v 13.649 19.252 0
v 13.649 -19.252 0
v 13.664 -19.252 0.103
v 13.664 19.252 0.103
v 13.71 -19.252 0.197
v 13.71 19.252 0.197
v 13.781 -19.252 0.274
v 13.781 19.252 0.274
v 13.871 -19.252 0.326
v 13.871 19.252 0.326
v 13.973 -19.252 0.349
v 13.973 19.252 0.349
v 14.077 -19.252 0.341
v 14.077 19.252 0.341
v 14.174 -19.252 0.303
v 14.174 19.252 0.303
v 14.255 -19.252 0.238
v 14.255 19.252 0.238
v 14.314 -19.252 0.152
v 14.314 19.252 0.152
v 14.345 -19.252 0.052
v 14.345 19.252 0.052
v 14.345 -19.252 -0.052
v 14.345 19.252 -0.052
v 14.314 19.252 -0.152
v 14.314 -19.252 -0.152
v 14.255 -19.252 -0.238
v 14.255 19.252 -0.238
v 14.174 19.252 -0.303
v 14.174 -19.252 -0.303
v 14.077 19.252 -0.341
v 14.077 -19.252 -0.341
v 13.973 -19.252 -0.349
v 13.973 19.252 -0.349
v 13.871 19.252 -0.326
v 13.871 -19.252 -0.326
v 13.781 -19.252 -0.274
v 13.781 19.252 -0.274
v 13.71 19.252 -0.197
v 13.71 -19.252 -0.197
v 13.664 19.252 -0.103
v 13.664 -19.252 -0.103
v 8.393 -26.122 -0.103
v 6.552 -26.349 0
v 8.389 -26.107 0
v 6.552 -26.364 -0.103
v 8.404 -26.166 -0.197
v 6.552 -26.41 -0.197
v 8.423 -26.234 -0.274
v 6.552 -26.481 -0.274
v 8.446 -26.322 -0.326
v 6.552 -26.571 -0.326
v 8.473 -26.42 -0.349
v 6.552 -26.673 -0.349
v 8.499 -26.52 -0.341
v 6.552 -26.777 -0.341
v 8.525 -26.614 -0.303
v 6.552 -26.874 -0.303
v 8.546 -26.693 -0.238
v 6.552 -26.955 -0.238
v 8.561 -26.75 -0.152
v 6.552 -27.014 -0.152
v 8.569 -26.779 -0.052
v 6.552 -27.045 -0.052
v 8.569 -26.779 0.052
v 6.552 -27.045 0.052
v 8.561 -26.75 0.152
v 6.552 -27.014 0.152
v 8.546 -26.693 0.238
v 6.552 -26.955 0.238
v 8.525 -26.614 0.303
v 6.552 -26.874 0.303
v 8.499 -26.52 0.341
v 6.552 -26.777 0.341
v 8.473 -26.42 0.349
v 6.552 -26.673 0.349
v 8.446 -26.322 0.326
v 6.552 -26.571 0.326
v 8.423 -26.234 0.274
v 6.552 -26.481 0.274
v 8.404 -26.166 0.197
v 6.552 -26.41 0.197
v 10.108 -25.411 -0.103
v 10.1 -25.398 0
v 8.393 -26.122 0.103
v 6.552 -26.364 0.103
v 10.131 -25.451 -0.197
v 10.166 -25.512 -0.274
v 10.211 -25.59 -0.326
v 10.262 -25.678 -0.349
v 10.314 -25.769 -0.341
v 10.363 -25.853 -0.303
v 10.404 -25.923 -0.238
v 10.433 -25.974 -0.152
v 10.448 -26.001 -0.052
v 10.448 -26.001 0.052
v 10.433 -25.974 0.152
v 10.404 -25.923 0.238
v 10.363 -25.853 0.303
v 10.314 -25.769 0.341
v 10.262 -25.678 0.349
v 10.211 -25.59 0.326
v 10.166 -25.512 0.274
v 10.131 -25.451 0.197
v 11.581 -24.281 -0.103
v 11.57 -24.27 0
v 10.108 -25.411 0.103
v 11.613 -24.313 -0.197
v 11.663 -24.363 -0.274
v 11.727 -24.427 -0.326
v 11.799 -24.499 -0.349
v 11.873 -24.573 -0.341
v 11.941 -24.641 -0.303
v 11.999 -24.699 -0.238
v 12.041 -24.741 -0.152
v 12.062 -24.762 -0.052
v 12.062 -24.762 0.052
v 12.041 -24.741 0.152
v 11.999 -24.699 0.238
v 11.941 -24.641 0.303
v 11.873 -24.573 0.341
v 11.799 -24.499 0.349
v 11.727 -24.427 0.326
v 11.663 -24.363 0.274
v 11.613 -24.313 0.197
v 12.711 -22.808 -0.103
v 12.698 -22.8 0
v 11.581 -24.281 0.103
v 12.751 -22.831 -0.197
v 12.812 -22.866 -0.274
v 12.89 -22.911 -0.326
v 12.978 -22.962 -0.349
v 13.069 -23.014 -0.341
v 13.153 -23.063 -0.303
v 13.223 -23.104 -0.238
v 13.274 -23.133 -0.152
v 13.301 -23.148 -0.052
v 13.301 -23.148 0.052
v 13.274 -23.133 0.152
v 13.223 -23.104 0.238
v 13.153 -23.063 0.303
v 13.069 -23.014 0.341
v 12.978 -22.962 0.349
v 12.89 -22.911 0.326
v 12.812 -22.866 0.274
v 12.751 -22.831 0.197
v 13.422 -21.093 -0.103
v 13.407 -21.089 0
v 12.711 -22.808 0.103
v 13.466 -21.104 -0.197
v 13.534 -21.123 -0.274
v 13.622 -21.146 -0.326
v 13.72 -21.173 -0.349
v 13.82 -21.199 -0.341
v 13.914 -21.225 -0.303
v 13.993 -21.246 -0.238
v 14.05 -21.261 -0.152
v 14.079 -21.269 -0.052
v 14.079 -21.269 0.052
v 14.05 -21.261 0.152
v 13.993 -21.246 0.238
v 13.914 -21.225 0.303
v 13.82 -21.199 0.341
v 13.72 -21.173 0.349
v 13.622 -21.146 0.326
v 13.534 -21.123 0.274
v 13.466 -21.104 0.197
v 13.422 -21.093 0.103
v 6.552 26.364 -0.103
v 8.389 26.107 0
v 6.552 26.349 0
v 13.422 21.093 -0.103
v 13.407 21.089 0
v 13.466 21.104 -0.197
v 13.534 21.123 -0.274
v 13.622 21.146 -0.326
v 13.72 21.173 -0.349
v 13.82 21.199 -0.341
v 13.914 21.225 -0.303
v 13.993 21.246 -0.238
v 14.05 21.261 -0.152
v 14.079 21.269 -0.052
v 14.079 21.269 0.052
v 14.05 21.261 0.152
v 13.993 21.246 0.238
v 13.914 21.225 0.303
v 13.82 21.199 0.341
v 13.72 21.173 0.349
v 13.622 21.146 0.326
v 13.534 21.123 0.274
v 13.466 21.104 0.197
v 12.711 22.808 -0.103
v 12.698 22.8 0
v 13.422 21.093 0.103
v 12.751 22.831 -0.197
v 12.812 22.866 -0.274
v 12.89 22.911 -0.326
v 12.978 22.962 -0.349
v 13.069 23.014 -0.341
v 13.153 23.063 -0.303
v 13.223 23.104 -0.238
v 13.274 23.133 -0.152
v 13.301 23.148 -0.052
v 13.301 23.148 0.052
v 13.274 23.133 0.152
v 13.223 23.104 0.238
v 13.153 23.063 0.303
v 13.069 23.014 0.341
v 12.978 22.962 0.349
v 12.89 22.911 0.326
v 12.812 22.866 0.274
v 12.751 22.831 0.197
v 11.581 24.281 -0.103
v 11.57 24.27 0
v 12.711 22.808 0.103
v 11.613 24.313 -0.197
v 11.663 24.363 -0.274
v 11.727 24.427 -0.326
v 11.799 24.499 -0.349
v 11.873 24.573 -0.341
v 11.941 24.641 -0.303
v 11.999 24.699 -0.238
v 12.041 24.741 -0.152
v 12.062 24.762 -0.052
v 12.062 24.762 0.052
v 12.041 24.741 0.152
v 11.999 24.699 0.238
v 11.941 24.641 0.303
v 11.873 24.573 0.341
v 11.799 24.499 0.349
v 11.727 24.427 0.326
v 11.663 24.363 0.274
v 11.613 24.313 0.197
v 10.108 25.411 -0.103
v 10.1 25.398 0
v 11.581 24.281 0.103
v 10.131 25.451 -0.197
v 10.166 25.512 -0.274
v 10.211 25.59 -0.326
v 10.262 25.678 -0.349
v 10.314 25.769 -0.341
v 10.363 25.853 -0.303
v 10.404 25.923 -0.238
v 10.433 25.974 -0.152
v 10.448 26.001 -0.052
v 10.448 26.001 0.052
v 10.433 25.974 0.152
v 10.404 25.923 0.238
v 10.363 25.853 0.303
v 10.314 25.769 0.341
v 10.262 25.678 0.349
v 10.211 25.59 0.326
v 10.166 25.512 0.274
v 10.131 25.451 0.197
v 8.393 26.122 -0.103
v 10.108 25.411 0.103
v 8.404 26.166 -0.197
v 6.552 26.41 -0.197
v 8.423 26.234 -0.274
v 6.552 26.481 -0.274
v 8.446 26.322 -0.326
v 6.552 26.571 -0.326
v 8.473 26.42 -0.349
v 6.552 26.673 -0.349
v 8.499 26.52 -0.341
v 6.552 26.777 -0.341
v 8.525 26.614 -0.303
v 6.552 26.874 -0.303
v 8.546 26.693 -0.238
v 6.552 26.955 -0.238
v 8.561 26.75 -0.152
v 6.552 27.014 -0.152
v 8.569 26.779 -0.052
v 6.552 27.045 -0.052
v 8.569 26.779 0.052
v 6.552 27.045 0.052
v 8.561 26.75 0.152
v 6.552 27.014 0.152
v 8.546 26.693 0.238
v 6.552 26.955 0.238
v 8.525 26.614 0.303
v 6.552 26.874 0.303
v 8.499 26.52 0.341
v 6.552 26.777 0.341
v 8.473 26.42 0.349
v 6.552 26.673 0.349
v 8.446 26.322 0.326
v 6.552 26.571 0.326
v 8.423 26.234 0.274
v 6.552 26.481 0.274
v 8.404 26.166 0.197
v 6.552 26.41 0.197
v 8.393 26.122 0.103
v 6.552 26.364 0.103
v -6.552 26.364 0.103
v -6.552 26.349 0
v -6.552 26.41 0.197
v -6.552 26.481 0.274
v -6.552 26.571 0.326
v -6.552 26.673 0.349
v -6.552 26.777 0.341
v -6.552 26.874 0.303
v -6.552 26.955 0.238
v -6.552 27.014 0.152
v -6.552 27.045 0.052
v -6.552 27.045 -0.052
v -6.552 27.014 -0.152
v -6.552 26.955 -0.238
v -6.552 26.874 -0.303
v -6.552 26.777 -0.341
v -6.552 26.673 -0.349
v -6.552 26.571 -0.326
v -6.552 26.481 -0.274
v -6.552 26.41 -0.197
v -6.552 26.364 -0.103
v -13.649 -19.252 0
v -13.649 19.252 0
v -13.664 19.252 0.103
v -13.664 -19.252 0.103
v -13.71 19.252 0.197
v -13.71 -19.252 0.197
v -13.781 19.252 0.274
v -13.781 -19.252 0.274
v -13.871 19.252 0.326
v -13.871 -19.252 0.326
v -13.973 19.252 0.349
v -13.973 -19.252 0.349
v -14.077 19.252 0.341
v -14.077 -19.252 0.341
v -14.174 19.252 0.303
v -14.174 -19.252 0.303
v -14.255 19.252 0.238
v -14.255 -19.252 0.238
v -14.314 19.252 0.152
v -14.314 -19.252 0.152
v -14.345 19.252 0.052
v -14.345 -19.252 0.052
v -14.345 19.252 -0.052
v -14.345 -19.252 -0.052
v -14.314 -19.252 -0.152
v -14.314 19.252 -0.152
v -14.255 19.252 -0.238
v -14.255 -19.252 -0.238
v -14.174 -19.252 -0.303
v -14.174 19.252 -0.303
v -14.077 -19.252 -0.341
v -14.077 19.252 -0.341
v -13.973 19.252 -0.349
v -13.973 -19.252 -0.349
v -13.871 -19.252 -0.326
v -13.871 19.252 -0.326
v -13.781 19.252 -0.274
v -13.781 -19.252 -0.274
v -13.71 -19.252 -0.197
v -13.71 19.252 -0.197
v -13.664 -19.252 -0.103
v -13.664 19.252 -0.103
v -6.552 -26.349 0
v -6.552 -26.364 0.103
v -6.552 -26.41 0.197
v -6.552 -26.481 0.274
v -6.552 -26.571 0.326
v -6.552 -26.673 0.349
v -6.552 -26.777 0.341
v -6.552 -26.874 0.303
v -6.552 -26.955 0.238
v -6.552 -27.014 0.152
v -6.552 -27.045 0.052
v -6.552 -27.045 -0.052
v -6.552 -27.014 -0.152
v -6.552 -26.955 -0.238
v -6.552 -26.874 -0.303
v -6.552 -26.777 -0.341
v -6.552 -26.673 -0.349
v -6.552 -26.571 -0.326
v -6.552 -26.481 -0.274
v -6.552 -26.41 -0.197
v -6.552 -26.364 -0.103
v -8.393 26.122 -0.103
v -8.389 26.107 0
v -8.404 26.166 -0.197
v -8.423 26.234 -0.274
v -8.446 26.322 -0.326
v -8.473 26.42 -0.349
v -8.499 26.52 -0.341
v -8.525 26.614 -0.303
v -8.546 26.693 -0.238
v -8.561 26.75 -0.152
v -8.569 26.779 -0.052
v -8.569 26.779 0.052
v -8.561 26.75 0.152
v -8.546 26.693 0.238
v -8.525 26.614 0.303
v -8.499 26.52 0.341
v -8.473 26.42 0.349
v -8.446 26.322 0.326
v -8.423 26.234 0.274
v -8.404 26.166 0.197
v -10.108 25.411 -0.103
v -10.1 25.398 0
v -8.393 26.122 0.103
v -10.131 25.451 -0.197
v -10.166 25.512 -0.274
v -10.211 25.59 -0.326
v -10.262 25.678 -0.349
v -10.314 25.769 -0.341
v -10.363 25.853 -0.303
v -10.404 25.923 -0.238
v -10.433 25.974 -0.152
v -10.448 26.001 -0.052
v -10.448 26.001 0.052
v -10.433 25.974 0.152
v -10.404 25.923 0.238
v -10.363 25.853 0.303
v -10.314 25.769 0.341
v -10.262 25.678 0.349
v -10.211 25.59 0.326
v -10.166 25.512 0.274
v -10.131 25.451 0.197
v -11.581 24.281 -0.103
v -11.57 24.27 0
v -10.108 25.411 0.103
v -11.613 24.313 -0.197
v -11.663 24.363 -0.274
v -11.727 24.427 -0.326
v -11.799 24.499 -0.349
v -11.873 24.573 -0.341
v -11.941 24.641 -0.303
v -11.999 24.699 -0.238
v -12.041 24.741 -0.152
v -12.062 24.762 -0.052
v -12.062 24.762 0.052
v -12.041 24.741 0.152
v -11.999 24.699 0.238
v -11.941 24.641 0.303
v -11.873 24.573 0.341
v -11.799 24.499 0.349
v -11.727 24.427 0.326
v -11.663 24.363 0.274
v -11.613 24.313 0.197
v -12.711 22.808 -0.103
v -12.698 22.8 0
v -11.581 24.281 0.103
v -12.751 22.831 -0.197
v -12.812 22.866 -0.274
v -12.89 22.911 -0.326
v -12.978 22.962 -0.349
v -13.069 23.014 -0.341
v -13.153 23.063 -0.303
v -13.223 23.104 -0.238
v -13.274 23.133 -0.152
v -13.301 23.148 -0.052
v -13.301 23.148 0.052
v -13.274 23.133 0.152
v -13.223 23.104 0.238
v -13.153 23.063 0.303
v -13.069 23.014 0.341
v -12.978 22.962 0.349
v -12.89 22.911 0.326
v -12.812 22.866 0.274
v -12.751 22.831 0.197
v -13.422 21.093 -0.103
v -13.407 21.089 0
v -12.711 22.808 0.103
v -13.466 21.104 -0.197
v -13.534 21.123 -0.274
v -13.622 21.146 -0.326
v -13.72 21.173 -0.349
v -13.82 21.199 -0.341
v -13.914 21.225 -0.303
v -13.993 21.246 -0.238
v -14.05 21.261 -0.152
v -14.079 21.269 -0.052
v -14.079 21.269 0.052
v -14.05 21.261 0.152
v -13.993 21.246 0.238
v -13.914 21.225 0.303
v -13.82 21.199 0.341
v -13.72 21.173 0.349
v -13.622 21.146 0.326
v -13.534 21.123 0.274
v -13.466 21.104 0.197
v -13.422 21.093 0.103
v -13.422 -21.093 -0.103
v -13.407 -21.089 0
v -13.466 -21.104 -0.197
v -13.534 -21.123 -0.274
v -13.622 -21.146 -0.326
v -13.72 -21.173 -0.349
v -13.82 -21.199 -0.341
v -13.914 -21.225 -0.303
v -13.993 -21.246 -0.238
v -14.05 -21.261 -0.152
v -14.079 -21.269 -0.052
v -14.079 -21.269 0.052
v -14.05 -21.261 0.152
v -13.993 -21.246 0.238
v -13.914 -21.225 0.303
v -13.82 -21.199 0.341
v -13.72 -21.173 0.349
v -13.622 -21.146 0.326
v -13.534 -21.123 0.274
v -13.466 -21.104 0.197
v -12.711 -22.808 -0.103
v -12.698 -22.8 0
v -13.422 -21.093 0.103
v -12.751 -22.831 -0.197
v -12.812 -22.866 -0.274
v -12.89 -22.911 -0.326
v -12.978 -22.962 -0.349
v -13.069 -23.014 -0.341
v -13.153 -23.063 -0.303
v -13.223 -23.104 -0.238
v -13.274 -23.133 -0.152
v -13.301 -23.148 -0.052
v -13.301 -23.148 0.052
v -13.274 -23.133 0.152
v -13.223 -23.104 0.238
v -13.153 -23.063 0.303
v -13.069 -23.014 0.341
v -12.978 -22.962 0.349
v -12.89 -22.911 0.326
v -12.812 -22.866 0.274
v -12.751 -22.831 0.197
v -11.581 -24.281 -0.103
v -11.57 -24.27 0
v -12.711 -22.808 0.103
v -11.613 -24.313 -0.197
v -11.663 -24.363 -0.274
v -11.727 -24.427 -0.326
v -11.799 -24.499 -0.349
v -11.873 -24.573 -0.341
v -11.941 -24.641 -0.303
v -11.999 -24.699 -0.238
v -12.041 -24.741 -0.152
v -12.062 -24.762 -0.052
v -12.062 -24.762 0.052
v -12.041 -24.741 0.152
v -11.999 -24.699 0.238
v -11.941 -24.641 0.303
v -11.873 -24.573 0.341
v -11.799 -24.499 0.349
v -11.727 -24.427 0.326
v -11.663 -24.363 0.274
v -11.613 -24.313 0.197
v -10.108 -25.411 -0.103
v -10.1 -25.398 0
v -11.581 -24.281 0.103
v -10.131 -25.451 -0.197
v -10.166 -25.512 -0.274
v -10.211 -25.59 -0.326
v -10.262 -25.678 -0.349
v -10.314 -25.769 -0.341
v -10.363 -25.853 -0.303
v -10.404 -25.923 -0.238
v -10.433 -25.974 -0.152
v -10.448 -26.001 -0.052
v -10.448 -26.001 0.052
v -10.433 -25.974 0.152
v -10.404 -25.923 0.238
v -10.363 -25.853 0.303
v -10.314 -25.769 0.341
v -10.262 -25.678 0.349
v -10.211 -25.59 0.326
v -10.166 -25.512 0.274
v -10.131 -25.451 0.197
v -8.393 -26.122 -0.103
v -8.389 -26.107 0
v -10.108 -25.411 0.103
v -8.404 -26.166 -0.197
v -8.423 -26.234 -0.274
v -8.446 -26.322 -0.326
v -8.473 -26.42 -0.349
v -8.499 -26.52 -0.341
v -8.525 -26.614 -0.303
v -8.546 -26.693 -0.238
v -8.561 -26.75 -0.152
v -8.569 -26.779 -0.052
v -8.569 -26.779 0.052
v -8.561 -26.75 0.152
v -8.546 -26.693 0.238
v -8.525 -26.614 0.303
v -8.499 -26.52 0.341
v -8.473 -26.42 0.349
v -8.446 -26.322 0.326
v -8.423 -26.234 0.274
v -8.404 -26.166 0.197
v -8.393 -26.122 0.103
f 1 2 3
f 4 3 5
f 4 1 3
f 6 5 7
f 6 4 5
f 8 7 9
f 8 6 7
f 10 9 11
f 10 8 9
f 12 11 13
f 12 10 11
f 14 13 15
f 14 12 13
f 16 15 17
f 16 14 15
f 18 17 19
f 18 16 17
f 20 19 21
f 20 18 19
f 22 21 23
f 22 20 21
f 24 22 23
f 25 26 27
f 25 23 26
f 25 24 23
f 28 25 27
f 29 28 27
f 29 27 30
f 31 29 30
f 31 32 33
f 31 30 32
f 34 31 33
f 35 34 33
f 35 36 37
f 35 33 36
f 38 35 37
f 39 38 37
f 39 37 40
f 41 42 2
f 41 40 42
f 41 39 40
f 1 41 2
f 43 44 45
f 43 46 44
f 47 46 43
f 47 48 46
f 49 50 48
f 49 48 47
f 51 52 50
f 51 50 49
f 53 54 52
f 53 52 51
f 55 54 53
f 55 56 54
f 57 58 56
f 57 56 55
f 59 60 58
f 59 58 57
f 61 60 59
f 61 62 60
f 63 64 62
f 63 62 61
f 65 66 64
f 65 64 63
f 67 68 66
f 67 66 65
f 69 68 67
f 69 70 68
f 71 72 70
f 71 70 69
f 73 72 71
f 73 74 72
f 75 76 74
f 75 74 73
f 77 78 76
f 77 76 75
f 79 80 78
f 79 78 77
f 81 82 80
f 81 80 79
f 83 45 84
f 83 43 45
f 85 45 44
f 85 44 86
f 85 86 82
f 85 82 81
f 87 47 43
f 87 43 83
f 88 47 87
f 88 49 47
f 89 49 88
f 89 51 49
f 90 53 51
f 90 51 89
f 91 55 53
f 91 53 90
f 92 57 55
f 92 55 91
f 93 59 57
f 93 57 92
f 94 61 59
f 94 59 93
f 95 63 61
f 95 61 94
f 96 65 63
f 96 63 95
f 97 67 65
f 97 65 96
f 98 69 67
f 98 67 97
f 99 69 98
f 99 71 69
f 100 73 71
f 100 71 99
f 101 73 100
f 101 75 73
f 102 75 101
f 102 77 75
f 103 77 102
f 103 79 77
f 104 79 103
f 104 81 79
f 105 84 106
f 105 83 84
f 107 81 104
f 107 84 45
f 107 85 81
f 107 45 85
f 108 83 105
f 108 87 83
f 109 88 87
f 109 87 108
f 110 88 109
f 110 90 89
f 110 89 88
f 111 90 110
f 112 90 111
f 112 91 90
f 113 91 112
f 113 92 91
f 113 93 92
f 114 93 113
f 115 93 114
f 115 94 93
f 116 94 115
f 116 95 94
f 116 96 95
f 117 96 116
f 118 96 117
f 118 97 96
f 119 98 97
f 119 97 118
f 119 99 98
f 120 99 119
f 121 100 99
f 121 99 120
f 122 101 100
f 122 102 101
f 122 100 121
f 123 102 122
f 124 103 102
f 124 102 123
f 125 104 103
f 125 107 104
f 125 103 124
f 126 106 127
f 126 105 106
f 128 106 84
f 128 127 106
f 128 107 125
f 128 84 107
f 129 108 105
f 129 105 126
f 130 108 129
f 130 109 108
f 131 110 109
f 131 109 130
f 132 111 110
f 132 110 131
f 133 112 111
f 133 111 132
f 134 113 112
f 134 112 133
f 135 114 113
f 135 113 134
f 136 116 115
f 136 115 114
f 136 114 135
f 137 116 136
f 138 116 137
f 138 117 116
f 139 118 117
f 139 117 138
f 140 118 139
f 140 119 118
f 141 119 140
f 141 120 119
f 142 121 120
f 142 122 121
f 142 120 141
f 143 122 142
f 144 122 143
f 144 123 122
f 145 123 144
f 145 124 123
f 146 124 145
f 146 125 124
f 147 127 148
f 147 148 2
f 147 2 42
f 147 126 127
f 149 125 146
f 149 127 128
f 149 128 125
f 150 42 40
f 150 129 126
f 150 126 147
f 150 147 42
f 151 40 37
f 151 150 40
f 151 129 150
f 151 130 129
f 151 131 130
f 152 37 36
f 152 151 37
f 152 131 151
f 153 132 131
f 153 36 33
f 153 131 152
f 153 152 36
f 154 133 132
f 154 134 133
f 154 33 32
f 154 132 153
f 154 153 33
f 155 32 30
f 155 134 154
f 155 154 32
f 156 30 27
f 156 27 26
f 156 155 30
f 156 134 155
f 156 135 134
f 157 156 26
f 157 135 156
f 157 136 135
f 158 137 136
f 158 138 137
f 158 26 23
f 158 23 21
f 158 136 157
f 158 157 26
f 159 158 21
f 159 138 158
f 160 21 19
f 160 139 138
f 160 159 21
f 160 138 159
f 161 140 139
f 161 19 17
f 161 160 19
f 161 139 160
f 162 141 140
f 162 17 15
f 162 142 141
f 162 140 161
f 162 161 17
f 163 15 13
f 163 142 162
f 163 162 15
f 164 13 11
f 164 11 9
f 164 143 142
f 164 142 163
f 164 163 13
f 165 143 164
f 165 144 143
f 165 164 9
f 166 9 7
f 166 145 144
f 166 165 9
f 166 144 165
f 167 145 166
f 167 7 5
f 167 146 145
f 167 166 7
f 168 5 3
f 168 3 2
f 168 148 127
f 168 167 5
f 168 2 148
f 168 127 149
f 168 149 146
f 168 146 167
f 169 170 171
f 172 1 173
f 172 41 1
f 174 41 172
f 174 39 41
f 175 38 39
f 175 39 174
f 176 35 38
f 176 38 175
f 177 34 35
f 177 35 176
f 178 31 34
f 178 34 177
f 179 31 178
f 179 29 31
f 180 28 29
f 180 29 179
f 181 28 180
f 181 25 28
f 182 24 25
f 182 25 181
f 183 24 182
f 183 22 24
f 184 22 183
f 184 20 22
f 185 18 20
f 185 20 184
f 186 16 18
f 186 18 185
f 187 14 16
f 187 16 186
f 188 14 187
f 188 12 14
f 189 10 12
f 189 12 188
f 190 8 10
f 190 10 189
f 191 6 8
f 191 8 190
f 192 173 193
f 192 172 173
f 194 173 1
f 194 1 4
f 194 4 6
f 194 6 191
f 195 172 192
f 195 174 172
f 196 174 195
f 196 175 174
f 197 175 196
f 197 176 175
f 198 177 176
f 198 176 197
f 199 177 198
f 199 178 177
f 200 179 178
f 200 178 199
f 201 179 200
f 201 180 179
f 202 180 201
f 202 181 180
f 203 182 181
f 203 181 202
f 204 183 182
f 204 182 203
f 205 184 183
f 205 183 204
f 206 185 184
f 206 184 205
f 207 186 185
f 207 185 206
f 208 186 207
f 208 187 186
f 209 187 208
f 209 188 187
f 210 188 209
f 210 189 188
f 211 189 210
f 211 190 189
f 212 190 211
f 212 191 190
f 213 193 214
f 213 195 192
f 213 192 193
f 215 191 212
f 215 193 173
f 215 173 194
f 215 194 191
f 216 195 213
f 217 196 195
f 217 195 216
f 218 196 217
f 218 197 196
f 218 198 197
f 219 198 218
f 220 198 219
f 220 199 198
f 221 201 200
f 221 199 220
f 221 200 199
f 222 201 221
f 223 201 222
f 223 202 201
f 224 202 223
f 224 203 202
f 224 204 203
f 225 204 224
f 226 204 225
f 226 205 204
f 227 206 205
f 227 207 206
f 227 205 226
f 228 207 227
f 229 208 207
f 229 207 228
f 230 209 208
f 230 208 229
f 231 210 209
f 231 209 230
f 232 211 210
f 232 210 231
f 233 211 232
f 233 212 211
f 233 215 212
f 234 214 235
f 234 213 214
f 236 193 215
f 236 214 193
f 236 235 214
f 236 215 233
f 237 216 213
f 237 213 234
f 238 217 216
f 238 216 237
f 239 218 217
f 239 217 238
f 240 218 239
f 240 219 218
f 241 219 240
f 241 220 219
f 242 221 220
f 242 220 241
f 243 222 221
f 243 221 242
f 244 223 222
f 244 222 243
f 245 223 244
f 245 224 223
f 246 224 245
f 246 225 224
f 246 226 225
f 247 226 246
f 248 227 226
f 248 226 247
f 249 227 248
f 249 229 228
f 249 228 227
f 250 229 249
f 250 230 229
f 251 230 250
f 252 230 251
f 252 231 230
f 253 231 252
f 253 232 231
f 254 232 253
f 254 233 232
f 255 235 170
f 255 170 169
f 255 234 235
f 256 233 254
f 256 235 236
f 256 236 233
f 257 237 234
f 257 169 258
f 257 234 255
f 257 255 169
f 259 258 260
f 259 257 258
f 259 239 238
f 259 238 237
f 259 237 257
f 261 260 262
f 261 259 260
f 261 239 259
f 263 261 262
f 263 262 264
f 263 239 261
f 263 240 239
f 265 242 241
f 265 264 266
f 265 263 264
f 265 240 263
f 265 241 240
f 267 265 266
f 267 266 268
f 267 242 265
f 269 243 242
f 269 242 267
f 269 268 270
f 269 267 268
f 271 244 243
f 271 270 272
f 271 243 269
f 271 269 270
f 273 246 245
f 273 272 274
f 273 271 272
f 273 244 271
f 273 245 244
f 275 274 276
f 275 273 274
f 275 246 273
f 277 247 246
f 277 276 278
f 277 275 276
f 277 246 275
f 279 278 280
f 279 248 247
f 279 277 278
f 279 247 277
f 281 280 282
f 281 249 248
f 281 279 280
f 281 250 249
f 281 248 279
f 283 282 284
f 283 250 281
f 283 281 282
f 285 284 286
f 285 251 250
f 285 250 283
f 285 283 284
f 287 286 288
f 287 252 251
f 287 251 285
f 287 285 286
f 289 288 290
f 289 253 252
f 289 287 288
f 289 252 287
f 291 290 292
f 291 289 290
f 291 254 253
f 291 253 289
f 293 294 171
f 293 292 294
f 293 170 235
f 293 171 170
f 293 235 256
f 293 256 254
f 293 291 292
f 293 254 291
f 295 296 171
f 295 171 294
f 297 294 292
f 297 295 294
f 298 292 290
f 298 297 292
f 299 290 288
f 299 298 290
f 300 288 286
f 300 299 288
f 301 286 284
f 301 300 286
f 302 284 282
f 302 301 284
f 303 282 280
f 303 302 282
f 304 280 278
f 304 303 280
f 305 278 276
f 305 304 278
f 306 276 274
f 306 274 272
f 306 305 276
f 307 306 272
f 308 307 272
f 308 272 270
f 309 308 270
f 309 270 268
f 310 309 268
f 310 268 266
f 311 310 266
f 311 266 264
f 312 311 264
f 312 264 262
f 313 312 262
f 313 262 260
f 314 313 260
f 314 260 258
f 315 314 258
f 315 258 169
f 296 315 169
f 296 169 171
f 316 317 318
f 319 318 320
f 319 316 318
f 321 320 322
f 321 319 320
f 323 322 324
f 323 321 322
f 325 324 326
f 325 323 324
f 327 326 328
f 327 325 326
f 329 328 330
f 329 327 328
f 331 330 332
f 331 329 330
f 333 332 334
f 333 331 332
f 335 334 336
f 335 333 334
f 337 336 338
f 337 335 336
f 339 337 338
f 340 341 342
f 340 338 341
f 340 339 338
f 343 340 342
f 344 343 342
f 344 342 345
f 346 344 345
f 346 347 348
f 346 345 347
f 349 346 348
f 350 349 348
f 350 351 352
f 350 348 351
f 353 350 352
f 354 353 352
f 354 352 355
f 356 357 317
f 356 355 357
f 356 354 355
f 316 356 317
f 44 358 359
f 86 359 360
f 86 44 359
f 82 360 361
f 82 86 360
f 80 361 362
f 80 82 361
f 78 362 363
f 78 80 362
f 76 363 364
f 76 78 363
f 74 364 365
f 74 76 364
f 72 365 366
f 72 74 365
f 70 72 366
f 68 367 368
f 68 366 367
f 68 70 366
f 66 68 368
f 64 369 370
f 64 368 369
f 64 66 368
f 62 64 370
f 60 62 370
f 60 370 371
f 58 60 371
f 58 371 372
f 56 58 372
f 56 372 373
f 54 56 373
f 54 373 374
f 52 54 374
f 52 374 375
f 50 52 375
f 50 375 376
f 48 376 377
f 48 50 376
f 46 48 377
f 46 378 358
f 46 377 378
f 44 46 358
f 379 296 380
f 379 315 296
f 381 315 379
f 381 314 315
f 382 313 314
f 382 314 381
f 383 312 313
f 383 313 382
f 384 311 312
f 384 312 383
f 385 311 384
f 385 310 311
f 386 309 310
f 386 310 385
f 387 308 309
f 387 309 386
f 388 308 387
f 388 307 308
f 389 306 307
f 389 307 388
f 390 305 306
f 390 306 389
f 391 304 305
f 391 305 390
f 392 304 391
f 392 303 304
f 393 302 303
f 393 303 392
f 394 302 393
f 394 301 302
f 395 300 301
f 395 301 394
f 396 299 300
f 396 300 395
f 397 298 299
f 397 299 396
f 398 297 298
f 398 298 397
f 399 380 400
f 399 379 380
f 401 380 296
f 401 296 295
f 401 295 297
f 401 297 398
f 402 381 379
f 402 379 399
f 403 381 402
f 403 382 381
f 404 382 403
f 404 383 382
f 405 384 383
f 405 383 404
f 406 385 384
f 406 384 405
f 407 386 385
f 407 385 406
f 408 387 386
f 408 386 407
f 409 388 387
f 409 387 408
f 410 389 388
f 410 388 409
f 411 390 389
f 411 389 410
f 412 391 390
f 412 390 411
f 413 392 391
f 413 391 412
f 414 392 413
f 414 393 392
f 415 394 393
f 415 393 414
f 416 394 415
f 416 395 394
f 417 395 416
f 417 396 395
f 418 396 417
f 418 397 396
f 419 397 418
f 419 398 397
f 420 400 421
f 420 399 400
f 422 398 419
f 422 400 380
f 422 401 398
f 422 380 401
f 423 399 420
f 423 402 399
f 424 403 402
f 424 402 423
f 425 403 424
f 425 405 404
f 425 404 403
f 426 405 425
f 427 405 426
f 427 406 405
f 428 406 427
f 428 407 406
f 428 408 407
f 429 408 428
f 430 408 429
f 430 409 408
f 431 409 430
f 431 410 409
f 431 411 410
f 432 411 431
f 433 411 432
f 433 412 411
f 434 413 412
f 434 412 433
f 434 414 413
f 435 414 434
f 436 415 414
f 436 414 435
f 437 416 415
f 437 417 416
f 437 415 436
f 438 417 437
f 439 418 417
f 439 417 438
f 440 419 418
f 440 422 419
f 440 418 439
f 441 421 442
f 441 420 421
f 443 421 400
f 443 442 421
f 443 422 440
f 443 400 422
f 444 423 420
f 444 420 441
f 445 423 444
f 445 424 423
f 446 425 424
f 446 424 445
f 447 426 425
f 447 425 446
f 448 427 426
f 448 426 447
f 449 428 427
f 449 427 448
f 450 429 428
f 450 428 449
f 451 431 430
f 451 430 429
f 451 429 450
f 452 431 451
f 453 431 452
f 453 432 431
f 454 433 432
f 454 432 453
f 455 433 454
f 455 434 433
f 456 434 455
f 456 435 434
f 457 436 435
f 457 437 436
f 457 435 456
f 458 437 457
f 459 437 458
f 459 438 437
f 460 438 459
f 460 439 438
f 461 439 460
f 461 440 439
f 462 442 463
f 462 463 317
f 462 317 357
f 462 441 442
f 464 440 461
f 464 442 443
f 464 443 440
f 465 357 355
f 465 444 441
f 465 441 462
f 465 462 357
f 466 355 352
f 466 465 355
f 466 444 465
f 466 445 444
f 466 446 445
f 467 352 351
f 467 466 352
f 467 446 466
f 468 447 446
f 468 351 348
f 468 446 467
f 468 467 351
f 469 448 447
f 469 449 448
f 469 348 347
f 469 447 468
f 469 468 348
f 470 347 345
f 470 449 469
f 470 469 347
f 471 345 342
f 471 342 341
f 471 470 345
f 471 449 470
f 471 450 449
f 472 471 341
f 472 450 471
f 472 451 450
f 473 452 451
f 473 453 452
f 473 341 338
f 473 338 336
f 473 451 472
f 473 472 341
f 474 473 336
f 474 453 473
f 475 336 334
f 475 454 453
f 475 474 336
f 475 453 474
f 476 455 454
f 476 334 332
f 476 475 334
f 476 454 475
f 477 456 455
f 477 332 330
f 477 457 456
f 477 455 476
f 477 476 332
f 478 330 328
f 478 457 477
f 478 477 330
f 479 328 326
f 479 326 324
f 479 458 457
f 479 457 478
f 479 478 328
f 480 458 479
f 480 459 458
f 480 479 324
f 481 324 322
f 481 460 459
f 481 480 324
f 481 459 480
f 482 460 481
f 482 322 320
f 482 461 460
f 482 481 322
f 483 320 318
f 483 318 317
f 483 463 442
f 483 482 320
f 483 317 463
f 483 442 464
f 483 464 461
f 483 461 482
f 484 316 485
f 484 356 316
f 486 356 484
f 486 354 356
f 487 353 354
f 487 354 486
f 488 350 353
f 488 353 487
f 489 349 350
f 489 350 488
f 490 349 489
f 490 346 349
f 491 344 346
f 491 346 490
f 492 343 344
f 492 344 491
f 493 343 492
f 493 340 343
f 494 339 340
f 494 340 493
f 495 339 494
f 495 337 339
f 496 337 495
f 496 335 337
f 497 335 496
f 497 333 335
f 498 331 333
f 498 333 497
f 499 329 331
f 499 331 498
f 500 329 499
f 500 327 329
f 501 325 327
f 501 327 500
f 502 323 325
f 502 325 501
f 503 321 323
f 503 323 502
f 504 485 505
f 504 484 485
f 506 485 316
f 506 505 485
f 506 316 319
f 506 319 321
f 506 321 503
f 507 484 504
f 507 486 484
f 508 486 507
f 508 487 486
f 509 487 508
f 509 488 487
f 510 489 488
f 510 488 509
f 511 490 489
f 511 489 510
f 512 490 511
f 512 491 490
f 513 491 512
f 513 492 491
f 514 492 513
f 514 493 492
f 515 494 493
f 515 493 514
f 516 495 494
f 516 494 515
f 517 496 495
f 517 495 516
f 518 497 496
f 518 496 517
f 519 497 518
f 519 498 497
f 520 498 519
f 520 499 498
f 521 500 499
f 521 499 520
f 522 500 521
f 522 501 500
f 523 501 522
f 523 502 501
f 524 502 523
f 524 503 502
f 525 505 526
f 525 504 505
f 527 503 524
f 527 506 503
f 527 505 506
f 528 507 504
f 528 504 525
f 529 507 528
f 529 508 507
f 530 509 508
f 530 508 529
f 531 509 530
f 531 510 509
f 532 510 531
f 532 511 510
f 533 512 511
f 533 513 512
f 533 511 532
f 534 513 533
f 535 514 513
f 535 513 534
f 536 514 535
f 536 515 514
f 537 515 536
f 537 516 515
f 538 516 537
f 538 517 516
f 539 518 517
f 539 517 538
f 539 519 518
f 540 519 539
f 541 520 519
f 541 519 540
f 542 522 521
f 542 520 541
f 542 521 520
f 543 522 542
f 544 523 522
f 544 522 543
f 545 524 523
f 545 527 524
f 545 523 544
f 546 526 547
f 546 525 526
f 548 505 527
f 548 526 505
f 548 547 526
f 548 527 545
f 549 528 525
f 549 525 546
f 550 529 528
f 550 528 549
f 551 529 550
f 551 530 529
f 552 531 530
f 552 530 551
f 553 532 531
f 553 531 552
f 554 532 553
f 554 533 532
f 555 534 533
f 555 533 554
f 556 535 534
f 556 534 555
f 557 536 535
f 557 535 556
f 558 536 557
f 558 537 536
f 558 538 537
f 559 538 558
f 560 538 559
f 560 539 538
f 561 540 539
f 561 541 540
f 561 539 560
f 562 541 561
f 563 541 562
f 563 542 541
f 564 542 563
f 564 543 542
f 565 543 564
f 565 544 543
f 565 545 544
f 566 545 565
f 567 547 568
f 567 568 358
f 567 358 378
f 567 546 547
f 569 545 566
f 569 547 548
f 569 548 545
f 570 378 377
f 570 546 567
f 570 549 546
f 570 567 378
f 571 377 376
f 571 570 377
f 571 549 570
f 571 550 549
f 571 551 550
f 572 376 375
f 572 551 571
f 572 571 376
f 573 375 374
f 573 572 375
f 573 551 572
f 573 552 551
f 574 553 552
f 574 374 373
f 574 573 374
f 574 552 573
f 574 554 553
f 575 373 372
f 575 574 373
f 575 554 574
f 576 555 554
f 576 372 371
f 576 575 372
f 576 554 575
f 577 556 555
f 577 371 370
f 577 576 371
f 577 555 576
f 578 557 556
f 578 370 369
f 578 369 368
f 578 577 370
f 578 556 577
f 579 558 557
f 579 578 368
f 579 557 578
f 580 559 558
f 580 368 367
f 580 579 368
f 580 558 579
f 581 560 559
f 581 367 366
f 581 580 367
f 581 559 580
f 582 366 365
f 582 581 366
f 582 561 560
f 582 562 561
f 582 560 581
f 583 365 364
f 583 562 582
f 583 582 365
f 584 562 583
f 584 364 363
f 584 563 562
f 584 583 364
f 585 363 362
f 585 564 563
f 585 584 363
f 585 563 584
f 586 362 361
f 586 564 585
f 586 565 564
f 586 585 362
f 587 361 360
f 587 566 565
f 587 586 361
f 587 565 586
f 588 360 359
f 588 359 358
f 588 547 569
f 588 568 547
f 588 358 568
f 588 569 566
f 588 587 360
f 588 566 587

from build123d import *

# Parameters (mm, degrees)
F2_R = 0.35


with BuildPart() as f3:
    # F3: sweep along a path in F0
    with BuildLine(Plane.XY) as f3_path:
        Line((6.55193, 26.69883), (-6.55193, 26.69883))
        ThreePointArc((-6.55193, 26.69883), (-11.8176834888, 24.5176834888), (-13.99883, 19.25193))
        Line((-13.99883, 19.25193), (-13.99883, -19.25193))
        ThreePointArc((-13.99883, -19.25193), (-11.8176834888, -24.5176834888), (-6.55193, -26.69883))
        Line((-6.55193, -26.69883), (6.55193, -26.69883))
        ThreePointArc((6.55193, -26.69883), (11.8176834888, -24.5176834888), (13.99883, -19.25193))
        Line((13.99883, -19.25193), (13.99883, 19.25193))
        ThreePointArc((13.99883, 19.25193), (11.8176834888, 24.5176834888), (6.55193, 26.69883))
    # F2 (on plane+point) → F3 (sweep)
    with BuildSketch(Plane.XZ.offset(19.25193)):
        with Locations((-13.99883, 0)):
            Circle(F2_R)
    sweep(path=f3_path.line)


solid = f3.part
